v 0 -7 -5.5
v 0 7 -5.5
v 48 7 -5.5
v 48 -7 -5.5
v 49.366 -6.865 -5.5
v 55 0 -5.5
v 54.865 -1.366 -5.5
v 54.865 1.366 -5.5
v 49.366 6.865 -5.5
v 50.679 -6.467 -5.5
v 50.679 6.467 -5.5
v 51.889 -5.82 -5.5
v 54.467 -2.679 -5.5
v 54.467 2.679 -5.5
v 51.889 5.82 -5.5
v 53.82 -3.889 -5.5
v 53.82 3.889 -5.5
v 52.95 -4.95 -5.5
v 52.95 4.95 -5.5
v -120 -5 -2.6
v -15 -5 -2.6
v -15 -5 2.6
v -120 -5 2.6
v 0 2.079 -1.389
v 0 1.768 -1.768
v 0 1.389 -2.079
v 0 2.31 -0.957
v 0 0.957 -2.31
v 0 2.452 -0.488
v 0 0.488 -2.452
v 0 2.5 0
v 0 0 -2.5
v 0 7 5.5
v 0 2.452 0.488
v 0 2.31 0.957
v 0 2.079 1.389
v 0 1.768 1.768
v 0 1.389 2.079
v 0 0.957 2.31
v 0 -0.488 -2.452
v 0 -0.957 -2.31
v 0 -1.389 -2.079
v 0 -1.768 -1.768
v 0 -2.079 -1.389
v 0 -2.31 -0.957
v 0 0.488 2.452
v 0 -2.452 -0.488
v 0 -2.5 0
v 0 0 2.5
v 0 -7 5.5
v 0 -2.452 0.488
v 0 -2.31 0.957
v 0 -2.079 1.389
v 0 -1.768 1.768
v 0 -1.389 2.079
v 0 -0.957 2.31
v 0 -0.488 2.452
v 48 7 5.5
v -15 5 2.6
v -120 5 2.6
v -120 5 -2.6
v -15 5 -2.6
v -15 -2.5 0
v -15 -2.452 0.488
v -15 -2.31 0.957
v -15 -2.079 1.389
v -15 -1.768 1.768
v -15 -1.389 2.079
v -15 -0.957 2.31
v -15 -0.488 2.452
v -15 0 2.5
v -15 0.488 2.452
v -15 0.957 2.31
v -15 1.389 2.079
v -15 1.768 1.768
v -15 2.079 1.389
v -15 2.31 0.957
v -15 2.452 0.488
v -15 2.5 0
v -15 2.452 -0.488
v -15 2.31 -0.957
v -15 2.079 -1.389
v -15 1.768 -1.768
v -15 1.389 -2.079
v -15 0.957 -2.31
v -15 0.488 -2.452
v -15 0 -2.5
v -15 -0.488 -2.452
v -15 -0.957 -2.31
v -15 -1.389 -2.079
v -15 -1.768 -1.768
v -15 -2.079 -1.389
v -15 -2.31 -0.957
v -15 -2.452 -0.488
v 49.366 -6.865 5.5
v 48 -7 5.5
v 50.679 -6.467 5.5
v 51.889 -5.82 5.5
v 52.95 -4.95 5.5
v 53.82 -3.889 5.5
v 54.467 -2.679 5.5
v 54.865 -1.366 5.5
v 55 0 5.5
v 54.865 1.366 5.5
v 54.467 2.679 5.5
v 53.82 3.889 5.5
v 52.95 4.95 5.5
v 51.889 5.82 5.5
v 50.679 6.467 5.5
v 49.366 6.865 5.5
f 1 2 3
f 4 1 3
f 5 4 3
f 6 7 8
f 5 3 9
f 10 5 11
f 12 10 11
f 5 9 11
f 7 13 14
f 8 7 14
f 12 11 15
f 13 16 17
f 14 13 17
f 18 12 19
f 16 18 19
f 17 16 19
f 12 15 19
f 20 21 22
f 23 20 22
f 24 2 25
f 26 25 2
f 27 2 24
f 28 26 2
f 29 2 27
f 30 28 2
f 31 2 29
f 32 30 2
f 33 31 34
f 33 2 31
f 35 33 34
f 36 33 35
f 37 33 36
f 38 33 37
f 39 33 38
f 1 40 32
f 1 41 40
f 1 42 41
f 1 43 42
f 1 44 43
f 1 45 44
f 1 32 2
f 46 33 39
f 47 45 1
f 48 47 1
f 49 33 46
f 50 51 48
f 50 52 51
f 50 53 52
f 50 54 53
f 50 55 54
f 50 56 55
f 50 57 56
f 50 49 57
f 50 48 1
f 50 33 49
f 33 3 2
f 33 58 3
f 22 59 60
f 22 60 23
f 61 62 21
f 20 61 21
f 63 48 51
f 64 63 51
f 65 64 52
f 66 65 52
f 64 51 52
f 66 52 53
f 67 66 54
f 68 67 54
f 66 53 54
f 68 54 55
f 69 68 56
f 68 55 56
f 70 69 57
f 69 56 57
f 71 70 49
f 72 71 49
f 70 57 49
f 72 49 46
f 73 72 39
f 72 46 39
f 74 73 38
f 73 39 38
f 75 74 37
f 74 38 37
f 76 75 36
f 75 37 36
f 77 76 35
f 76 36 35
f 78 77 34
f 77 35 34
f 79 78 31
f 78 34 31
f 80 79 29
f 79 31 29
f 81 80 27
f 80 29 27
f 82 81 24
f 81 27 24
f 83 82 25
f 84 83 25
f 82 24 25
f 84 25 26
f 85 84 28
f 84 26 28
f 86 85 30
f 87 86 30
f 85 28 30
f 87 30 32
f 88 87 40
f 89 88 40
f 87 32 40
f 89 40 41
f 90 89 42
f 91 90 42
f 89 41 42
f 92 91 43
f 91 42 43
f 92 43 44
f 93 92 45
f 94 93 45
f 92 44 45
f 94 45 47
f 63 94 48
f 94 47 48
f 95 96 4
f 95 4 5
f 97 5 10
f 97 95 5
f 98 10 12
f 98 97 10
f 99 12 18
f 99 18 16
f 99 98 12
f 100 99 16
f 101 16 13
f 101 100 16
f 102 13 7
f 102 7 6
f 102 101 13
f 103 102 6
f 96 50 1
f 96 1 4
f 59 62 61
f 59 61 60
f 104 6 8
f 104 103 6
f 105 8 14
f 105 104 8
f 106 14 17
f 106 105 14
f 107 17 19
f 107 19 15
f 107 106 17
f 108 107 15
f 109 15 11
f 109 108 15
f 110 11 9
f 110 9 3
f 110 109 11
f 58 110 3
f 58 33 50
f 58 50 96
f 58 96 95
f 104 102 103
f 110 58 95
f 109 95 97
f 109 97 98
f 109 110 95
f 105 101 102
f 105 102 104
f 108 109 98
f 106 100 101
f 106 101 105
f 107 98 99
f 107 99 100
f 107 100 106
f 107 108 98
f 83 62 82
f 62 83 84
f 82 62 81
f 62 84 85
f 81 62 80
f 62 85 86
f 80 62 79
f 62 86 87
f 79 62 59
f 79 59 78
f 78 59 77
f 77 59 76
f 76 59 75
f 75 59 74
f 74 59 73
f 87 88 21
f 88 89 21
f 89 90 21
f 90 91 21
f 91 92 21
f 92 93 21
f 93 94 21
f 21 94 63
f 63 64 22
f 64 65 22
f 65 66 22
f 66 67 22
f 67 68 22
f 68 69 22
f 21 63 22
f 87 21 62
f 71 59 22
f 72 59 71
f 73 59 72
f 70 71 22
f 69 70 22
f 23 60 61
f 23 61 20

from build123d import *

# Parameters (mm, degrees)
F1_DEPTH = 5.5
F2_R     = 2.5
F3_DEPTH = 15
F4_W     = 10
F4_H     = 5.2
F5_DEPTH = 105


with BuildPart() as f1:
    # F0 (on Top) → F1 (new body, symmetric)
    with BuildSketch(Plane.XY):
        with BuildLine():
            Line((0, 7), (0, 0))
            Line((0, 0), (0, -7))
            Line((0, -7), (48, -7))
            ThreePointArc((48, -7), (52.949747, -4.949747), (55, 0))
            ThreePointArc((55, 0), (52.949747, 4.949747), (48, 7))
            Line((48, 7), (0, 7))
        make_face()
    extrude(amount=F1_DEPTH, both=True)

    # F2 (on face) → F3 (join)
    with BuildSketch(Plane(origin=(0, 0, 0), x_dir=(0, -1, 0), z_dir=(-1, 0, 0))):
        Circle(F2_R)
    extrude(amount=F3_DEPTH)

    # F4 (on face) → F5 (join)
    with BuildSketch(Plane(origin=(-15, 0, 0), x_dir=(0, -1, 0), z_dir=(-1, 0, 0))):
        Rectangle(F4_W, F4_H)
    extrude(amount=F5_DEPTH)


solid = f1.part
